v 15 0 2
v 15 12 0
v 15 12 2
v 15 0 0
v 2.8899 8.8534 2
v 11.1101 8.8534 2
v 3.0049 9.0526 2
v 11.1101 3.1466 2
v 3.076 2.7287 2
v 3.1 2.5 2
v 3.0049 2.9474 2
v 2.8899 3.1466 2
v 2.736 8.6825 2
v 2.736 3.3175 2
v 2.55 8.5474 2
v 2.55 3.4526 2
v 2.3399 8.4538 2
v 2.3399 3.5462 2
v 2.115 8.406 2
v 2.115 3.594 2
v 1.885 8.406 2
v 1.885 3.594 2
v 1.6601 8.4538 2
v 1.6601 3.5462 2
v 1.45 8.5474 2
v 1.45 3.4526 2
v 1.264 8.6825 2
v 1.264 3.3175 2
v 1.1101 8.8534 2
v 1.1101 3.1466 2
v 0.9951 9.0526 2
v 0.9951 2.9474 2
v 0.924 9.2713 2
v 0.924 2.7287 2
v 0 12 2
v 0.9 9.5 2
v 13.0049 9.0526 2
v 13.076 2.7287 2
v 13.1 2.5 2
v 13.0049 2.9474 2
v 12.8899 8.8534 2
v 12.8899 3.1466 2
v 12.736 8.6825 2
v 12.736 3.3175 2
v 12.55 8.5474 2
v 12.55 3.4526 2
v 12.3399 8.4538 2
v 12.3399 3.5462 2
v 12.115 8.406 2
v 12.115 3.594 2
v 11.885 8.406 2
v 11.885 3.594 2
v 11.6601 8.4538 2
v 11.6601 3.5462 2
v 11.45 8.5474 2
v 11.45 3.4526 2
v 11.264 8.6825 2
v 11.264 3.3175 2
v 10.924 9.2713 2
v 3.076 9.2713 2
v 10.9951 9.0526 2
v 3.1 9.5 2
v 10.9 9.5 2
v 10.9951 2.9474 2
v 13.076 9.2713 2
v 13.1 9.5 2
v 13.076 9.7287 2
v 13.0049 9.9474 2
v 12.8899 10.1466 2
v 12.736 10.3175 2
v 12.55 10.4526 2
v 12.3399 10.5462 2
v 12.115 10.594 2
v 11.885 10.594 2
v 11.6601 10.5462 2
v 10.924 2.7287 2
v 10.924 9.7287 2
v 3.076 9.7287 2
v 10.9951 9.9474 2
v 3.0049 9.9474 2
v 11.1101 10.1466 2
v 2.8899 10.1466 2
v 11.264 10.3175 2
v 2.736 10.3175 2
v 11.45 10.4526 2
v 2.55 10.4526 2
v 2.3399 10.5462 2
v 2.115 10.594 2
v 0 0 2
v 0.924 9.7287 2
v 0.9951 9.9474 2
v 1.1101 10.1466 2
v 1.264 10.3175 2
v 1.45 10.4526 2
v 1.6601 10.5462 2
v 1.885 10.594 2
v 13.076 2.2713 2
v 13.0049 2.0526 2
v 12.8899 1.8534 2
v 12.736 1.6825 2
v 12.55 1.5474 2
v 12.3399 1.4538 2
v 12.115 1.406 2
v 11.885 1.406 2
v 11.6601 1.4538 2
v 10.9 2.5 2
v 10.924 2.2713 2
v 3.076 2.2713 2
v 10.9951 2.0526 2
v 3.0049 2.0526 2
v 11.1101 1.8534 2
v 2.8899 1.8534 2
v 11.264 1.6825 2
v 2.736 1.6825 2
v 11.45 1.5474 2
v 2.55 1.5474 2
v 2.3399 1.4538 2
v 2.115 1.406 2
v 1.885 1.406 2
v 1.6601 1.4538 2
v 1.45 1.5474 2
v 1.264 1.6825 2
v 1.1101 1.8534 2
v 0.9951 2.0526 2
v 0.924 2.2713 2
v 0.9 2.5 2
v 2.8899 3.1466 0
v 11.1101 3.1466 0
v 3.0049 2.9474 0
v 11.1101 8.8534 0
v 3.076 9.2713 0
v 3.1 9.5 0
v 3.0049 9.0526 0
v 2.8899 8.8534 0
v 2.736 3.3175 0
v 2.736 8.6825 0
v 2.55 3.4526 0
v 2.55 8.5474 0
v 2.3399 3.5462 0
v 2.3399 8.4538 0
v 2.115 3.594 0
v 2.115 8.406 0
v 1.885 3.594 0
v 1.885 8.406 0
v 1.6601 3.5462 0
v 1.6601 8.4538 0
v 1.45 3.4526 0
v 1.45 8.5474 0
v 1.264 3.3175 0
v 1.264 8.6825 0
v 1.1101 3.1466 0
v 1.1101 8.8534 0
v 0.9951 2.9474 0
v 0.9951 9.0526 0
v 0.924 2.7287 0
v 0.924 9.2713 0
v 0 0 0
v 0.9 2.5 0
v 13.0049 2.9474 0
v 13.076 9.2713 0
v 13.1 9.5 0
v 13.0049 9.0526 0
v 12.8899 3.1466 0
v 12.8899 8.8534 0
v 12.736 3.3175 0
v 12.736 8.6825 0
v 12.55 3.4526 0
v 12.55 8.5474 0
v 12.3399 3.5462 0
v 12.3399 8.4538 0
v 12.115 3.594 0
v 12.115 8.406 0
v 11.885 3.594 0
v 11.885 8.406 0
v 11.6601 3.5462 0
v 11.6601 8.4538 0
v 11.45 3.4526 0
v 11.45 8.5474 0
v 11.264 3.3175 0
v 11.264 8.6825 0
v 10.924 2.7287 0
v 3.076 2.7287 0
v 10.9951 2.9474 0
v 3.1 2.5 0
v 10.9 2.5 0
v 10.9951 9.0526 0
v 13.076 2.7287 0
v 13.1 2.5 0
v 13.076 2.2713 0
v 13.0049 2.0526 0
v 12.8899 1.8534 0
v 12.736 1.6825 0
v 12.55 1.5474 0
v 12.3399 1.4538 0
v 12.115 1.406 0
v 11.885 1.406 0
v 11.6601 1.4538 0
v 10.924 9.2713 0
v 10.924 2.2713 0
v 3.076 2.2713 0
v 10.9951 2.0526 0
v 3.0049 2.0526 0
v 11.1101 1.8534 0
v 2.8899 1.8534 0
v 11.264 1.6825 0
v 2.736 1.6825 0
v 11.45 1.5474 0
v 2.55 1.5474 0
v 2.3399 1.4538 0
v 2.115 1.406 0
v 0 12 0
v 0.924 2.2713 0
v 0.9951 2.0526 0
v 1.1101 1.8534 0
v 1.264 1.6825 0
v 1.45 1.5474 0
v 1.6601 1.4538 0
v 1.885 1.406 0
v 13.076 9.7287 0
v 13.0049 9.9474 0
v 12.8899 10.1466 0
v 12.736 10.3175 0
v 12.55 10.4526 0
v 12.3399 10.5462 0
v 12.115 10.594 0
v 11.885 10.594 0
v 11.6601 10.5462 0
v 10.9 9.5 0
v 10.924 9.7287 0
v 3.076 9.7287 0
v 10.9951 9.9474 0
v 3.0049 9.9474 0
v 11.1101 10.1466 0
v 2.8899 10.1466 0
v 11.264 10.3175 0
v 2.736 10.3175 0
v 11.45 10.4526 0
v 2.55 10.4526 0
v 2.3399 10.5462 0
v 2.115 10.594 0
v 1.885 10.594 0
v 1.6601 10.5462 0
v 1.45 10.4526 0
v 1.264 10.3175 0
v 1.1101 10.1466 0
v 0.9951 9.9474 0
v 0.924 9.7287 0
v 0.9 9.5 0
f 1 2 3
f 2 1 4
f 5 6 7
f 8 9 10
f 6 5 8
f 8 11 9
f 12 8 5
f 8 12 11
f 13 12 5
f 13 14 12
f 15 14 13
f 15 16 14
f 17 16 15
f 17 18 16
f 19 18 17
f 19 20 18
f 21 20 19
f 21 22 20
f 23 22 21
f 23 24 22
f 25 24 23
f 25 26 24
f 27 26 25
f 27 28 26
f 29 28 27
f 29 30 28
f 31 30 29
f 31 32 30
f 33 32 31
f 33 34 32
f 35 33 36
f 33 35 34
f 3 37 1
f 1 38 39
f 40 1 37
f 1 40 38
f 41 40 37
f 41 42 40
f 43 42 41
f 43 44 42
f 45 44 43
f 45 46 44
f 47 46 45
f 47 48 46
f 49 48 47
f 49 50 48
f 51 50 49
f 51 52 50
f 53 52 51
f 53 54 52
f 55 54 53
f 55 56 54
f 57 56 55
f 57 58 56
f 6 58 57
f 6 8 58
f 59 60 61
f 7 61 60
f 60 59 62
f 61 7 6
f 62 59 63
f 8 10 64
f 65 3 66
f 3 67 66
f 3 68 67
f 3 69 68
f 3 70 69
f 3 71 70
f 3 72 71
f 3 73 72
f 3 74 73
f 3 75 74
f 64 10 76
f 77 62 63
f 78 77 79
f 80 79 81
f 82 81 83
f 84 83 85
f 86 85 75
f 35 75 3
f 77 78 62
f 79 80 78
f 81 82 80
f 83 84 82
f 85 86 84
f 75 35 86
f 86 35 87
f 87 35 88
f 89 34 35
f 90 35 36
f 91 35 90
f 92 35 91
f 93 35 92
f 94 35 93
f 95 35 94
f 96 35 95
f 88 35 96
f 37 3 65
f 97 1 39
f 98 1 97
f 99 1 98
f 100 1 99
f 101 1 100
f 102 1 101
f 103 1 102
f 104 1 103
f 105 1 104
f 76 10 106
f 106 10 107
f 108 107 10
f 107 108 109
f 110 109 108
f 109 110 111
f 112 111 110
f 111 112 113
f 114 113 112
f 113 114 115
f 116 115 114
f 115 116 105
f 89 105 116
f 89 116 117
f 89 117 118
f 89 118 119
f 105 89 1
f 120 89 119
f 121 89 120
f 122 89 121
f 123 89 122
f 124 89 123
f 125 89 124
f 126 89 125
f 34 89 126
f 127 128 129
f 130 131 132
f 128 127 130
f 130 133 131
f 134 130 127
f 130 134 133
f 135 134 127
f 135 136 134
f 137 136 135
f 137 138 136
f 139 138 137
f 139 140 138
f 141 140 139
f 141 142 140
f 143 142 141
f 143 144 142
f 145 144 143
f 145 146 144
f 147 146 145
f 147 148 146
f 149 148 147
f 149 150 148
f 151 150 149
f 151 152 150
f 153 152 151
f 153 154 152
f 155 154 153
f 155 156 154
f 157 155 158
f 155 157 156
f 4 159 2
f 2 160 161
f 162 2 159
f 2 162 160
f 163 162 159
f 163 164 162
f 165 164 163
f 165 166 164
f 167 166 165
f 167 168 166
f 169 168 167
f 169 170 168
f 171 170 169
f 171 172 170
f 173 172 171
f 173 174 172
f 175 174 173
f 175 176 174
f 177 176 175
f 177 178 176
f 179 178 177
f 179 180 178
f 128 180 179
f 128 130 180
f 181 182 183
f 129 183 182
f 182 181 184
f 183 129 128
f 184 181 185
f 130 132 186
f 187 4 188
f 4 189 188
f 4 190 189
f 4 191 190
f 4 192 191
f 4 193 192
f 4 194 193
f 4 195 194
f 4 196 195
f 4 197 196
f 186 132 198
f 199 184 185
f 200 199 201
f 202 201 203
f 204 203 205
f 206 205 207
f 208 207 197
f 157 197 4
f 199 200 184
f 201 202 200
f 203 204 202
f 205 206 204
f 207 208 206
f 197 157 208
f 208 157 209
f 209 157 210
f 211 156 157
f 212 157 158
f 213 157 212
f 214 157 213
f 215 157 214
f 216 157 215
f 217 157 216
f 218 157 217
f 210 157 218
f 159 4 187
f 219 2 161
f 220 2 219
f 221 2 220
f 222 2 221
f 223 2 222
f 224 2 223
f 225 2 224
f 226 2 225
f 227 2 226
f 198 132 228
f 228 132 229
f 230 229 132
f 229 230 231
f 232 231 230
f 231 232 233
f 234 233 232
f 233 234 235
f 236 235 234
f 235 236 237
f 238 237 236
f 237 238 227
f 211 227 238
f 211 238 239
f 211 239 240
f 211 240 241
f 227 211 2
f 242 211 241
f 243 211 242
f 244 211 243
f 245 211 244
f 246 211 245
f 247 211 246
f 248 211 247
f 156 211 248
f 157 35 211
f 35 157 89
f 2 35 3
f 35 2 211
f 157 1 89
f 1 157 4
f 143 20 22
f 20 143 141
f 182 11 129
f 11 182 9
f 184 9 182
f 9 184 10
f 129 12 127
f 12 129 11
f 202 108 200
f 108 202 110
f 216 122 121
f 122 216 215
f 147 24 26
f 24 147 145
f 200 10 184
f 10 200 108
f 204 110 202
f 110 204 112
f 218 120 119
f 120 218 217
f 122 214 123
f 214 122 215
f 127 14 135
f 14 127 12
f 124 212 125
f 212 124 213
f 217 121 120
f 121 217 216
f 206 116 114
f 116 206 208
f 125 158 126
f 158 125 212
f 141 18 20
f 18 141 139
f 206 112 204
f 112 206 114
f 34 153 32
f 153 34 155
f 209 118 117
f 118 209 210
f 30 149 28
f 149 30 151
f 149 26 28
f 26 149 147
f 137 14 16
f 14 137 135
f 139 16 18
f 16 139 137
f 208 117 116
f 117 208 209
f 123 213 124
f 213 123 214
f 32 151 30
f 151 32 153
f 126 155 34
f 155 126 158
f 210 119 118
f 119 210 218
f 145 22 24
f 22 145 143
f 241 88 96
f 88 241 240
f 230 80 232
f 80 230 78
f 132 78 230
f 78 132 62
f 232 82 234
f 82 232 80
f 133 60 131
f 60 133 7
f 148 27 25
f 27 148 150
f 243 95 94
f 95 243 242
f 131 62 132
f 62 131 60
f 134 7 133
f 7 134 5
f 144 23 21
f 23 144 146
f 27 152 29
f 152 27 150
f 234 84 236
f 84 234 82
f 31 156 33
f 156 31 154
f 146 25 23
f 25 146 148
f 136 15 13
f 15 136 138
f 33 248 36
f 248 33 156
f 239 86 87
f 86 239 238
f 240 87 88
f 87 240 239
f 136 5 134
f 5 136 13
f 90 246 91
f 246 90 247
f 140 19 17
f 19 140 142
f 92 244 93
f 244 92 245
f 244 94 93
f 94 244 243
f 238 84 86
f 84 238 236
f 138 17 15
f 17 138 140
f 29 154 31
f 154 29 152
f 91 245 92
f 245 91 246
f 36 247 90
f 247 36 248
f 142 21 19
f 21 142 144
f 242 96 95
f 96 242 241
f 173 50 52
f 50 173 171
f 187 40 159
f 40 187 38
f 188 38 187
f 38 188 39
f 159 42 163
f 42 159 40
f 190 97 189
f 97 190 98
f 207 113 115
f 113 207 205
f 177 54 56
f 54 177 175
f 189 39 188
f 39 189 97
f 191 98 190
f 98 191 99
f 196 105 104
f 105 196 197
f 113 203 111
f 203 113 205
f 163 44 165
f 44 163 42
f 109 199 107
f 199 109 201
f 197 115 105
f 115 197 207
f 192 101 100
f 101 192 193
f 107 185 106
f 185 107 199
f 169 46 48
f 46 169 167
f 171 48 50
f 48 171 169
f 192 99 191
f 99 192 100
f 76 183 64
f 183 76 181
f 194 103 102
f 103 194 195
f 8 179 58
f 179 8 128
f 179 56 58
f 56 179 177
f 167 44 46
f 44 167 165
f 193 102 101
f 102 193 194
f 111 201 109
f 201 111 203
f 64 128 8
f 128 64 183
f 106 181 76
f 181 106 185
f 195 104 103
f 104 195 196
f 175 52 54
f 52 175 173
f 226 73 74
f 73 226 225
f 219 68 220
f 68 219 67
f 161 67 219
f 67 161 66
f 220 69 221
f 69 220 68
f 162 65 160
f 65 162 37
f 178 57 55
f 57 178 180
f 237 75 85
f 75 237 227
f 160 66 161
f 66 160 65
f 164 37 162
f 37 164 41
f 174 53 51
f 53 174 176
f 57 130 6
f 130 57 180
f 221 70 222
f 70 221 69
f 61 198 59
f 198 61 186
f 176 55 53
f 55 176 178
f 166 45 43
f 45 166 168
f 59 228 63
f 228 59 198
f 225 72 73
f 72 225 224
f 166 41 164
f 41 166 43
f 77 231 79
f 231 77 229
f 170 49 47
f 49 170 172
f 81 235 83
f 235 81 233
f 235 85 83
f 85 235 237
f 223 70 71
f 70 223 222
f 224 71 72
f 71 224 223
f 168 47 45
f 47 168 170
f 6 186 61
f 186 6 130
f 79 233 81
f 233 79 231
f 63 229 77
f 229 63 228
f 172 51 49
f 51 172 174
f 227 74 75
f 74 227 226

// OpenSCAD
$fn=30;
width1=12;
width2=7;
height=15;

difference() {
translate([0,0,0]) cube([height, width1, 2]);
translate([2, width1/2-width2/2,0]) cylinder(r=1.1, h=4);
translate([2, width1/2+width2/2,0]) cylinder(r=1.1, h=4);

translate([12, width1/2-width2/2,0]) cylinder(r=1.1, h=4);
translate([12, width1/2+width2/2,0]) cylinder(r=1.1, h=4);
}
